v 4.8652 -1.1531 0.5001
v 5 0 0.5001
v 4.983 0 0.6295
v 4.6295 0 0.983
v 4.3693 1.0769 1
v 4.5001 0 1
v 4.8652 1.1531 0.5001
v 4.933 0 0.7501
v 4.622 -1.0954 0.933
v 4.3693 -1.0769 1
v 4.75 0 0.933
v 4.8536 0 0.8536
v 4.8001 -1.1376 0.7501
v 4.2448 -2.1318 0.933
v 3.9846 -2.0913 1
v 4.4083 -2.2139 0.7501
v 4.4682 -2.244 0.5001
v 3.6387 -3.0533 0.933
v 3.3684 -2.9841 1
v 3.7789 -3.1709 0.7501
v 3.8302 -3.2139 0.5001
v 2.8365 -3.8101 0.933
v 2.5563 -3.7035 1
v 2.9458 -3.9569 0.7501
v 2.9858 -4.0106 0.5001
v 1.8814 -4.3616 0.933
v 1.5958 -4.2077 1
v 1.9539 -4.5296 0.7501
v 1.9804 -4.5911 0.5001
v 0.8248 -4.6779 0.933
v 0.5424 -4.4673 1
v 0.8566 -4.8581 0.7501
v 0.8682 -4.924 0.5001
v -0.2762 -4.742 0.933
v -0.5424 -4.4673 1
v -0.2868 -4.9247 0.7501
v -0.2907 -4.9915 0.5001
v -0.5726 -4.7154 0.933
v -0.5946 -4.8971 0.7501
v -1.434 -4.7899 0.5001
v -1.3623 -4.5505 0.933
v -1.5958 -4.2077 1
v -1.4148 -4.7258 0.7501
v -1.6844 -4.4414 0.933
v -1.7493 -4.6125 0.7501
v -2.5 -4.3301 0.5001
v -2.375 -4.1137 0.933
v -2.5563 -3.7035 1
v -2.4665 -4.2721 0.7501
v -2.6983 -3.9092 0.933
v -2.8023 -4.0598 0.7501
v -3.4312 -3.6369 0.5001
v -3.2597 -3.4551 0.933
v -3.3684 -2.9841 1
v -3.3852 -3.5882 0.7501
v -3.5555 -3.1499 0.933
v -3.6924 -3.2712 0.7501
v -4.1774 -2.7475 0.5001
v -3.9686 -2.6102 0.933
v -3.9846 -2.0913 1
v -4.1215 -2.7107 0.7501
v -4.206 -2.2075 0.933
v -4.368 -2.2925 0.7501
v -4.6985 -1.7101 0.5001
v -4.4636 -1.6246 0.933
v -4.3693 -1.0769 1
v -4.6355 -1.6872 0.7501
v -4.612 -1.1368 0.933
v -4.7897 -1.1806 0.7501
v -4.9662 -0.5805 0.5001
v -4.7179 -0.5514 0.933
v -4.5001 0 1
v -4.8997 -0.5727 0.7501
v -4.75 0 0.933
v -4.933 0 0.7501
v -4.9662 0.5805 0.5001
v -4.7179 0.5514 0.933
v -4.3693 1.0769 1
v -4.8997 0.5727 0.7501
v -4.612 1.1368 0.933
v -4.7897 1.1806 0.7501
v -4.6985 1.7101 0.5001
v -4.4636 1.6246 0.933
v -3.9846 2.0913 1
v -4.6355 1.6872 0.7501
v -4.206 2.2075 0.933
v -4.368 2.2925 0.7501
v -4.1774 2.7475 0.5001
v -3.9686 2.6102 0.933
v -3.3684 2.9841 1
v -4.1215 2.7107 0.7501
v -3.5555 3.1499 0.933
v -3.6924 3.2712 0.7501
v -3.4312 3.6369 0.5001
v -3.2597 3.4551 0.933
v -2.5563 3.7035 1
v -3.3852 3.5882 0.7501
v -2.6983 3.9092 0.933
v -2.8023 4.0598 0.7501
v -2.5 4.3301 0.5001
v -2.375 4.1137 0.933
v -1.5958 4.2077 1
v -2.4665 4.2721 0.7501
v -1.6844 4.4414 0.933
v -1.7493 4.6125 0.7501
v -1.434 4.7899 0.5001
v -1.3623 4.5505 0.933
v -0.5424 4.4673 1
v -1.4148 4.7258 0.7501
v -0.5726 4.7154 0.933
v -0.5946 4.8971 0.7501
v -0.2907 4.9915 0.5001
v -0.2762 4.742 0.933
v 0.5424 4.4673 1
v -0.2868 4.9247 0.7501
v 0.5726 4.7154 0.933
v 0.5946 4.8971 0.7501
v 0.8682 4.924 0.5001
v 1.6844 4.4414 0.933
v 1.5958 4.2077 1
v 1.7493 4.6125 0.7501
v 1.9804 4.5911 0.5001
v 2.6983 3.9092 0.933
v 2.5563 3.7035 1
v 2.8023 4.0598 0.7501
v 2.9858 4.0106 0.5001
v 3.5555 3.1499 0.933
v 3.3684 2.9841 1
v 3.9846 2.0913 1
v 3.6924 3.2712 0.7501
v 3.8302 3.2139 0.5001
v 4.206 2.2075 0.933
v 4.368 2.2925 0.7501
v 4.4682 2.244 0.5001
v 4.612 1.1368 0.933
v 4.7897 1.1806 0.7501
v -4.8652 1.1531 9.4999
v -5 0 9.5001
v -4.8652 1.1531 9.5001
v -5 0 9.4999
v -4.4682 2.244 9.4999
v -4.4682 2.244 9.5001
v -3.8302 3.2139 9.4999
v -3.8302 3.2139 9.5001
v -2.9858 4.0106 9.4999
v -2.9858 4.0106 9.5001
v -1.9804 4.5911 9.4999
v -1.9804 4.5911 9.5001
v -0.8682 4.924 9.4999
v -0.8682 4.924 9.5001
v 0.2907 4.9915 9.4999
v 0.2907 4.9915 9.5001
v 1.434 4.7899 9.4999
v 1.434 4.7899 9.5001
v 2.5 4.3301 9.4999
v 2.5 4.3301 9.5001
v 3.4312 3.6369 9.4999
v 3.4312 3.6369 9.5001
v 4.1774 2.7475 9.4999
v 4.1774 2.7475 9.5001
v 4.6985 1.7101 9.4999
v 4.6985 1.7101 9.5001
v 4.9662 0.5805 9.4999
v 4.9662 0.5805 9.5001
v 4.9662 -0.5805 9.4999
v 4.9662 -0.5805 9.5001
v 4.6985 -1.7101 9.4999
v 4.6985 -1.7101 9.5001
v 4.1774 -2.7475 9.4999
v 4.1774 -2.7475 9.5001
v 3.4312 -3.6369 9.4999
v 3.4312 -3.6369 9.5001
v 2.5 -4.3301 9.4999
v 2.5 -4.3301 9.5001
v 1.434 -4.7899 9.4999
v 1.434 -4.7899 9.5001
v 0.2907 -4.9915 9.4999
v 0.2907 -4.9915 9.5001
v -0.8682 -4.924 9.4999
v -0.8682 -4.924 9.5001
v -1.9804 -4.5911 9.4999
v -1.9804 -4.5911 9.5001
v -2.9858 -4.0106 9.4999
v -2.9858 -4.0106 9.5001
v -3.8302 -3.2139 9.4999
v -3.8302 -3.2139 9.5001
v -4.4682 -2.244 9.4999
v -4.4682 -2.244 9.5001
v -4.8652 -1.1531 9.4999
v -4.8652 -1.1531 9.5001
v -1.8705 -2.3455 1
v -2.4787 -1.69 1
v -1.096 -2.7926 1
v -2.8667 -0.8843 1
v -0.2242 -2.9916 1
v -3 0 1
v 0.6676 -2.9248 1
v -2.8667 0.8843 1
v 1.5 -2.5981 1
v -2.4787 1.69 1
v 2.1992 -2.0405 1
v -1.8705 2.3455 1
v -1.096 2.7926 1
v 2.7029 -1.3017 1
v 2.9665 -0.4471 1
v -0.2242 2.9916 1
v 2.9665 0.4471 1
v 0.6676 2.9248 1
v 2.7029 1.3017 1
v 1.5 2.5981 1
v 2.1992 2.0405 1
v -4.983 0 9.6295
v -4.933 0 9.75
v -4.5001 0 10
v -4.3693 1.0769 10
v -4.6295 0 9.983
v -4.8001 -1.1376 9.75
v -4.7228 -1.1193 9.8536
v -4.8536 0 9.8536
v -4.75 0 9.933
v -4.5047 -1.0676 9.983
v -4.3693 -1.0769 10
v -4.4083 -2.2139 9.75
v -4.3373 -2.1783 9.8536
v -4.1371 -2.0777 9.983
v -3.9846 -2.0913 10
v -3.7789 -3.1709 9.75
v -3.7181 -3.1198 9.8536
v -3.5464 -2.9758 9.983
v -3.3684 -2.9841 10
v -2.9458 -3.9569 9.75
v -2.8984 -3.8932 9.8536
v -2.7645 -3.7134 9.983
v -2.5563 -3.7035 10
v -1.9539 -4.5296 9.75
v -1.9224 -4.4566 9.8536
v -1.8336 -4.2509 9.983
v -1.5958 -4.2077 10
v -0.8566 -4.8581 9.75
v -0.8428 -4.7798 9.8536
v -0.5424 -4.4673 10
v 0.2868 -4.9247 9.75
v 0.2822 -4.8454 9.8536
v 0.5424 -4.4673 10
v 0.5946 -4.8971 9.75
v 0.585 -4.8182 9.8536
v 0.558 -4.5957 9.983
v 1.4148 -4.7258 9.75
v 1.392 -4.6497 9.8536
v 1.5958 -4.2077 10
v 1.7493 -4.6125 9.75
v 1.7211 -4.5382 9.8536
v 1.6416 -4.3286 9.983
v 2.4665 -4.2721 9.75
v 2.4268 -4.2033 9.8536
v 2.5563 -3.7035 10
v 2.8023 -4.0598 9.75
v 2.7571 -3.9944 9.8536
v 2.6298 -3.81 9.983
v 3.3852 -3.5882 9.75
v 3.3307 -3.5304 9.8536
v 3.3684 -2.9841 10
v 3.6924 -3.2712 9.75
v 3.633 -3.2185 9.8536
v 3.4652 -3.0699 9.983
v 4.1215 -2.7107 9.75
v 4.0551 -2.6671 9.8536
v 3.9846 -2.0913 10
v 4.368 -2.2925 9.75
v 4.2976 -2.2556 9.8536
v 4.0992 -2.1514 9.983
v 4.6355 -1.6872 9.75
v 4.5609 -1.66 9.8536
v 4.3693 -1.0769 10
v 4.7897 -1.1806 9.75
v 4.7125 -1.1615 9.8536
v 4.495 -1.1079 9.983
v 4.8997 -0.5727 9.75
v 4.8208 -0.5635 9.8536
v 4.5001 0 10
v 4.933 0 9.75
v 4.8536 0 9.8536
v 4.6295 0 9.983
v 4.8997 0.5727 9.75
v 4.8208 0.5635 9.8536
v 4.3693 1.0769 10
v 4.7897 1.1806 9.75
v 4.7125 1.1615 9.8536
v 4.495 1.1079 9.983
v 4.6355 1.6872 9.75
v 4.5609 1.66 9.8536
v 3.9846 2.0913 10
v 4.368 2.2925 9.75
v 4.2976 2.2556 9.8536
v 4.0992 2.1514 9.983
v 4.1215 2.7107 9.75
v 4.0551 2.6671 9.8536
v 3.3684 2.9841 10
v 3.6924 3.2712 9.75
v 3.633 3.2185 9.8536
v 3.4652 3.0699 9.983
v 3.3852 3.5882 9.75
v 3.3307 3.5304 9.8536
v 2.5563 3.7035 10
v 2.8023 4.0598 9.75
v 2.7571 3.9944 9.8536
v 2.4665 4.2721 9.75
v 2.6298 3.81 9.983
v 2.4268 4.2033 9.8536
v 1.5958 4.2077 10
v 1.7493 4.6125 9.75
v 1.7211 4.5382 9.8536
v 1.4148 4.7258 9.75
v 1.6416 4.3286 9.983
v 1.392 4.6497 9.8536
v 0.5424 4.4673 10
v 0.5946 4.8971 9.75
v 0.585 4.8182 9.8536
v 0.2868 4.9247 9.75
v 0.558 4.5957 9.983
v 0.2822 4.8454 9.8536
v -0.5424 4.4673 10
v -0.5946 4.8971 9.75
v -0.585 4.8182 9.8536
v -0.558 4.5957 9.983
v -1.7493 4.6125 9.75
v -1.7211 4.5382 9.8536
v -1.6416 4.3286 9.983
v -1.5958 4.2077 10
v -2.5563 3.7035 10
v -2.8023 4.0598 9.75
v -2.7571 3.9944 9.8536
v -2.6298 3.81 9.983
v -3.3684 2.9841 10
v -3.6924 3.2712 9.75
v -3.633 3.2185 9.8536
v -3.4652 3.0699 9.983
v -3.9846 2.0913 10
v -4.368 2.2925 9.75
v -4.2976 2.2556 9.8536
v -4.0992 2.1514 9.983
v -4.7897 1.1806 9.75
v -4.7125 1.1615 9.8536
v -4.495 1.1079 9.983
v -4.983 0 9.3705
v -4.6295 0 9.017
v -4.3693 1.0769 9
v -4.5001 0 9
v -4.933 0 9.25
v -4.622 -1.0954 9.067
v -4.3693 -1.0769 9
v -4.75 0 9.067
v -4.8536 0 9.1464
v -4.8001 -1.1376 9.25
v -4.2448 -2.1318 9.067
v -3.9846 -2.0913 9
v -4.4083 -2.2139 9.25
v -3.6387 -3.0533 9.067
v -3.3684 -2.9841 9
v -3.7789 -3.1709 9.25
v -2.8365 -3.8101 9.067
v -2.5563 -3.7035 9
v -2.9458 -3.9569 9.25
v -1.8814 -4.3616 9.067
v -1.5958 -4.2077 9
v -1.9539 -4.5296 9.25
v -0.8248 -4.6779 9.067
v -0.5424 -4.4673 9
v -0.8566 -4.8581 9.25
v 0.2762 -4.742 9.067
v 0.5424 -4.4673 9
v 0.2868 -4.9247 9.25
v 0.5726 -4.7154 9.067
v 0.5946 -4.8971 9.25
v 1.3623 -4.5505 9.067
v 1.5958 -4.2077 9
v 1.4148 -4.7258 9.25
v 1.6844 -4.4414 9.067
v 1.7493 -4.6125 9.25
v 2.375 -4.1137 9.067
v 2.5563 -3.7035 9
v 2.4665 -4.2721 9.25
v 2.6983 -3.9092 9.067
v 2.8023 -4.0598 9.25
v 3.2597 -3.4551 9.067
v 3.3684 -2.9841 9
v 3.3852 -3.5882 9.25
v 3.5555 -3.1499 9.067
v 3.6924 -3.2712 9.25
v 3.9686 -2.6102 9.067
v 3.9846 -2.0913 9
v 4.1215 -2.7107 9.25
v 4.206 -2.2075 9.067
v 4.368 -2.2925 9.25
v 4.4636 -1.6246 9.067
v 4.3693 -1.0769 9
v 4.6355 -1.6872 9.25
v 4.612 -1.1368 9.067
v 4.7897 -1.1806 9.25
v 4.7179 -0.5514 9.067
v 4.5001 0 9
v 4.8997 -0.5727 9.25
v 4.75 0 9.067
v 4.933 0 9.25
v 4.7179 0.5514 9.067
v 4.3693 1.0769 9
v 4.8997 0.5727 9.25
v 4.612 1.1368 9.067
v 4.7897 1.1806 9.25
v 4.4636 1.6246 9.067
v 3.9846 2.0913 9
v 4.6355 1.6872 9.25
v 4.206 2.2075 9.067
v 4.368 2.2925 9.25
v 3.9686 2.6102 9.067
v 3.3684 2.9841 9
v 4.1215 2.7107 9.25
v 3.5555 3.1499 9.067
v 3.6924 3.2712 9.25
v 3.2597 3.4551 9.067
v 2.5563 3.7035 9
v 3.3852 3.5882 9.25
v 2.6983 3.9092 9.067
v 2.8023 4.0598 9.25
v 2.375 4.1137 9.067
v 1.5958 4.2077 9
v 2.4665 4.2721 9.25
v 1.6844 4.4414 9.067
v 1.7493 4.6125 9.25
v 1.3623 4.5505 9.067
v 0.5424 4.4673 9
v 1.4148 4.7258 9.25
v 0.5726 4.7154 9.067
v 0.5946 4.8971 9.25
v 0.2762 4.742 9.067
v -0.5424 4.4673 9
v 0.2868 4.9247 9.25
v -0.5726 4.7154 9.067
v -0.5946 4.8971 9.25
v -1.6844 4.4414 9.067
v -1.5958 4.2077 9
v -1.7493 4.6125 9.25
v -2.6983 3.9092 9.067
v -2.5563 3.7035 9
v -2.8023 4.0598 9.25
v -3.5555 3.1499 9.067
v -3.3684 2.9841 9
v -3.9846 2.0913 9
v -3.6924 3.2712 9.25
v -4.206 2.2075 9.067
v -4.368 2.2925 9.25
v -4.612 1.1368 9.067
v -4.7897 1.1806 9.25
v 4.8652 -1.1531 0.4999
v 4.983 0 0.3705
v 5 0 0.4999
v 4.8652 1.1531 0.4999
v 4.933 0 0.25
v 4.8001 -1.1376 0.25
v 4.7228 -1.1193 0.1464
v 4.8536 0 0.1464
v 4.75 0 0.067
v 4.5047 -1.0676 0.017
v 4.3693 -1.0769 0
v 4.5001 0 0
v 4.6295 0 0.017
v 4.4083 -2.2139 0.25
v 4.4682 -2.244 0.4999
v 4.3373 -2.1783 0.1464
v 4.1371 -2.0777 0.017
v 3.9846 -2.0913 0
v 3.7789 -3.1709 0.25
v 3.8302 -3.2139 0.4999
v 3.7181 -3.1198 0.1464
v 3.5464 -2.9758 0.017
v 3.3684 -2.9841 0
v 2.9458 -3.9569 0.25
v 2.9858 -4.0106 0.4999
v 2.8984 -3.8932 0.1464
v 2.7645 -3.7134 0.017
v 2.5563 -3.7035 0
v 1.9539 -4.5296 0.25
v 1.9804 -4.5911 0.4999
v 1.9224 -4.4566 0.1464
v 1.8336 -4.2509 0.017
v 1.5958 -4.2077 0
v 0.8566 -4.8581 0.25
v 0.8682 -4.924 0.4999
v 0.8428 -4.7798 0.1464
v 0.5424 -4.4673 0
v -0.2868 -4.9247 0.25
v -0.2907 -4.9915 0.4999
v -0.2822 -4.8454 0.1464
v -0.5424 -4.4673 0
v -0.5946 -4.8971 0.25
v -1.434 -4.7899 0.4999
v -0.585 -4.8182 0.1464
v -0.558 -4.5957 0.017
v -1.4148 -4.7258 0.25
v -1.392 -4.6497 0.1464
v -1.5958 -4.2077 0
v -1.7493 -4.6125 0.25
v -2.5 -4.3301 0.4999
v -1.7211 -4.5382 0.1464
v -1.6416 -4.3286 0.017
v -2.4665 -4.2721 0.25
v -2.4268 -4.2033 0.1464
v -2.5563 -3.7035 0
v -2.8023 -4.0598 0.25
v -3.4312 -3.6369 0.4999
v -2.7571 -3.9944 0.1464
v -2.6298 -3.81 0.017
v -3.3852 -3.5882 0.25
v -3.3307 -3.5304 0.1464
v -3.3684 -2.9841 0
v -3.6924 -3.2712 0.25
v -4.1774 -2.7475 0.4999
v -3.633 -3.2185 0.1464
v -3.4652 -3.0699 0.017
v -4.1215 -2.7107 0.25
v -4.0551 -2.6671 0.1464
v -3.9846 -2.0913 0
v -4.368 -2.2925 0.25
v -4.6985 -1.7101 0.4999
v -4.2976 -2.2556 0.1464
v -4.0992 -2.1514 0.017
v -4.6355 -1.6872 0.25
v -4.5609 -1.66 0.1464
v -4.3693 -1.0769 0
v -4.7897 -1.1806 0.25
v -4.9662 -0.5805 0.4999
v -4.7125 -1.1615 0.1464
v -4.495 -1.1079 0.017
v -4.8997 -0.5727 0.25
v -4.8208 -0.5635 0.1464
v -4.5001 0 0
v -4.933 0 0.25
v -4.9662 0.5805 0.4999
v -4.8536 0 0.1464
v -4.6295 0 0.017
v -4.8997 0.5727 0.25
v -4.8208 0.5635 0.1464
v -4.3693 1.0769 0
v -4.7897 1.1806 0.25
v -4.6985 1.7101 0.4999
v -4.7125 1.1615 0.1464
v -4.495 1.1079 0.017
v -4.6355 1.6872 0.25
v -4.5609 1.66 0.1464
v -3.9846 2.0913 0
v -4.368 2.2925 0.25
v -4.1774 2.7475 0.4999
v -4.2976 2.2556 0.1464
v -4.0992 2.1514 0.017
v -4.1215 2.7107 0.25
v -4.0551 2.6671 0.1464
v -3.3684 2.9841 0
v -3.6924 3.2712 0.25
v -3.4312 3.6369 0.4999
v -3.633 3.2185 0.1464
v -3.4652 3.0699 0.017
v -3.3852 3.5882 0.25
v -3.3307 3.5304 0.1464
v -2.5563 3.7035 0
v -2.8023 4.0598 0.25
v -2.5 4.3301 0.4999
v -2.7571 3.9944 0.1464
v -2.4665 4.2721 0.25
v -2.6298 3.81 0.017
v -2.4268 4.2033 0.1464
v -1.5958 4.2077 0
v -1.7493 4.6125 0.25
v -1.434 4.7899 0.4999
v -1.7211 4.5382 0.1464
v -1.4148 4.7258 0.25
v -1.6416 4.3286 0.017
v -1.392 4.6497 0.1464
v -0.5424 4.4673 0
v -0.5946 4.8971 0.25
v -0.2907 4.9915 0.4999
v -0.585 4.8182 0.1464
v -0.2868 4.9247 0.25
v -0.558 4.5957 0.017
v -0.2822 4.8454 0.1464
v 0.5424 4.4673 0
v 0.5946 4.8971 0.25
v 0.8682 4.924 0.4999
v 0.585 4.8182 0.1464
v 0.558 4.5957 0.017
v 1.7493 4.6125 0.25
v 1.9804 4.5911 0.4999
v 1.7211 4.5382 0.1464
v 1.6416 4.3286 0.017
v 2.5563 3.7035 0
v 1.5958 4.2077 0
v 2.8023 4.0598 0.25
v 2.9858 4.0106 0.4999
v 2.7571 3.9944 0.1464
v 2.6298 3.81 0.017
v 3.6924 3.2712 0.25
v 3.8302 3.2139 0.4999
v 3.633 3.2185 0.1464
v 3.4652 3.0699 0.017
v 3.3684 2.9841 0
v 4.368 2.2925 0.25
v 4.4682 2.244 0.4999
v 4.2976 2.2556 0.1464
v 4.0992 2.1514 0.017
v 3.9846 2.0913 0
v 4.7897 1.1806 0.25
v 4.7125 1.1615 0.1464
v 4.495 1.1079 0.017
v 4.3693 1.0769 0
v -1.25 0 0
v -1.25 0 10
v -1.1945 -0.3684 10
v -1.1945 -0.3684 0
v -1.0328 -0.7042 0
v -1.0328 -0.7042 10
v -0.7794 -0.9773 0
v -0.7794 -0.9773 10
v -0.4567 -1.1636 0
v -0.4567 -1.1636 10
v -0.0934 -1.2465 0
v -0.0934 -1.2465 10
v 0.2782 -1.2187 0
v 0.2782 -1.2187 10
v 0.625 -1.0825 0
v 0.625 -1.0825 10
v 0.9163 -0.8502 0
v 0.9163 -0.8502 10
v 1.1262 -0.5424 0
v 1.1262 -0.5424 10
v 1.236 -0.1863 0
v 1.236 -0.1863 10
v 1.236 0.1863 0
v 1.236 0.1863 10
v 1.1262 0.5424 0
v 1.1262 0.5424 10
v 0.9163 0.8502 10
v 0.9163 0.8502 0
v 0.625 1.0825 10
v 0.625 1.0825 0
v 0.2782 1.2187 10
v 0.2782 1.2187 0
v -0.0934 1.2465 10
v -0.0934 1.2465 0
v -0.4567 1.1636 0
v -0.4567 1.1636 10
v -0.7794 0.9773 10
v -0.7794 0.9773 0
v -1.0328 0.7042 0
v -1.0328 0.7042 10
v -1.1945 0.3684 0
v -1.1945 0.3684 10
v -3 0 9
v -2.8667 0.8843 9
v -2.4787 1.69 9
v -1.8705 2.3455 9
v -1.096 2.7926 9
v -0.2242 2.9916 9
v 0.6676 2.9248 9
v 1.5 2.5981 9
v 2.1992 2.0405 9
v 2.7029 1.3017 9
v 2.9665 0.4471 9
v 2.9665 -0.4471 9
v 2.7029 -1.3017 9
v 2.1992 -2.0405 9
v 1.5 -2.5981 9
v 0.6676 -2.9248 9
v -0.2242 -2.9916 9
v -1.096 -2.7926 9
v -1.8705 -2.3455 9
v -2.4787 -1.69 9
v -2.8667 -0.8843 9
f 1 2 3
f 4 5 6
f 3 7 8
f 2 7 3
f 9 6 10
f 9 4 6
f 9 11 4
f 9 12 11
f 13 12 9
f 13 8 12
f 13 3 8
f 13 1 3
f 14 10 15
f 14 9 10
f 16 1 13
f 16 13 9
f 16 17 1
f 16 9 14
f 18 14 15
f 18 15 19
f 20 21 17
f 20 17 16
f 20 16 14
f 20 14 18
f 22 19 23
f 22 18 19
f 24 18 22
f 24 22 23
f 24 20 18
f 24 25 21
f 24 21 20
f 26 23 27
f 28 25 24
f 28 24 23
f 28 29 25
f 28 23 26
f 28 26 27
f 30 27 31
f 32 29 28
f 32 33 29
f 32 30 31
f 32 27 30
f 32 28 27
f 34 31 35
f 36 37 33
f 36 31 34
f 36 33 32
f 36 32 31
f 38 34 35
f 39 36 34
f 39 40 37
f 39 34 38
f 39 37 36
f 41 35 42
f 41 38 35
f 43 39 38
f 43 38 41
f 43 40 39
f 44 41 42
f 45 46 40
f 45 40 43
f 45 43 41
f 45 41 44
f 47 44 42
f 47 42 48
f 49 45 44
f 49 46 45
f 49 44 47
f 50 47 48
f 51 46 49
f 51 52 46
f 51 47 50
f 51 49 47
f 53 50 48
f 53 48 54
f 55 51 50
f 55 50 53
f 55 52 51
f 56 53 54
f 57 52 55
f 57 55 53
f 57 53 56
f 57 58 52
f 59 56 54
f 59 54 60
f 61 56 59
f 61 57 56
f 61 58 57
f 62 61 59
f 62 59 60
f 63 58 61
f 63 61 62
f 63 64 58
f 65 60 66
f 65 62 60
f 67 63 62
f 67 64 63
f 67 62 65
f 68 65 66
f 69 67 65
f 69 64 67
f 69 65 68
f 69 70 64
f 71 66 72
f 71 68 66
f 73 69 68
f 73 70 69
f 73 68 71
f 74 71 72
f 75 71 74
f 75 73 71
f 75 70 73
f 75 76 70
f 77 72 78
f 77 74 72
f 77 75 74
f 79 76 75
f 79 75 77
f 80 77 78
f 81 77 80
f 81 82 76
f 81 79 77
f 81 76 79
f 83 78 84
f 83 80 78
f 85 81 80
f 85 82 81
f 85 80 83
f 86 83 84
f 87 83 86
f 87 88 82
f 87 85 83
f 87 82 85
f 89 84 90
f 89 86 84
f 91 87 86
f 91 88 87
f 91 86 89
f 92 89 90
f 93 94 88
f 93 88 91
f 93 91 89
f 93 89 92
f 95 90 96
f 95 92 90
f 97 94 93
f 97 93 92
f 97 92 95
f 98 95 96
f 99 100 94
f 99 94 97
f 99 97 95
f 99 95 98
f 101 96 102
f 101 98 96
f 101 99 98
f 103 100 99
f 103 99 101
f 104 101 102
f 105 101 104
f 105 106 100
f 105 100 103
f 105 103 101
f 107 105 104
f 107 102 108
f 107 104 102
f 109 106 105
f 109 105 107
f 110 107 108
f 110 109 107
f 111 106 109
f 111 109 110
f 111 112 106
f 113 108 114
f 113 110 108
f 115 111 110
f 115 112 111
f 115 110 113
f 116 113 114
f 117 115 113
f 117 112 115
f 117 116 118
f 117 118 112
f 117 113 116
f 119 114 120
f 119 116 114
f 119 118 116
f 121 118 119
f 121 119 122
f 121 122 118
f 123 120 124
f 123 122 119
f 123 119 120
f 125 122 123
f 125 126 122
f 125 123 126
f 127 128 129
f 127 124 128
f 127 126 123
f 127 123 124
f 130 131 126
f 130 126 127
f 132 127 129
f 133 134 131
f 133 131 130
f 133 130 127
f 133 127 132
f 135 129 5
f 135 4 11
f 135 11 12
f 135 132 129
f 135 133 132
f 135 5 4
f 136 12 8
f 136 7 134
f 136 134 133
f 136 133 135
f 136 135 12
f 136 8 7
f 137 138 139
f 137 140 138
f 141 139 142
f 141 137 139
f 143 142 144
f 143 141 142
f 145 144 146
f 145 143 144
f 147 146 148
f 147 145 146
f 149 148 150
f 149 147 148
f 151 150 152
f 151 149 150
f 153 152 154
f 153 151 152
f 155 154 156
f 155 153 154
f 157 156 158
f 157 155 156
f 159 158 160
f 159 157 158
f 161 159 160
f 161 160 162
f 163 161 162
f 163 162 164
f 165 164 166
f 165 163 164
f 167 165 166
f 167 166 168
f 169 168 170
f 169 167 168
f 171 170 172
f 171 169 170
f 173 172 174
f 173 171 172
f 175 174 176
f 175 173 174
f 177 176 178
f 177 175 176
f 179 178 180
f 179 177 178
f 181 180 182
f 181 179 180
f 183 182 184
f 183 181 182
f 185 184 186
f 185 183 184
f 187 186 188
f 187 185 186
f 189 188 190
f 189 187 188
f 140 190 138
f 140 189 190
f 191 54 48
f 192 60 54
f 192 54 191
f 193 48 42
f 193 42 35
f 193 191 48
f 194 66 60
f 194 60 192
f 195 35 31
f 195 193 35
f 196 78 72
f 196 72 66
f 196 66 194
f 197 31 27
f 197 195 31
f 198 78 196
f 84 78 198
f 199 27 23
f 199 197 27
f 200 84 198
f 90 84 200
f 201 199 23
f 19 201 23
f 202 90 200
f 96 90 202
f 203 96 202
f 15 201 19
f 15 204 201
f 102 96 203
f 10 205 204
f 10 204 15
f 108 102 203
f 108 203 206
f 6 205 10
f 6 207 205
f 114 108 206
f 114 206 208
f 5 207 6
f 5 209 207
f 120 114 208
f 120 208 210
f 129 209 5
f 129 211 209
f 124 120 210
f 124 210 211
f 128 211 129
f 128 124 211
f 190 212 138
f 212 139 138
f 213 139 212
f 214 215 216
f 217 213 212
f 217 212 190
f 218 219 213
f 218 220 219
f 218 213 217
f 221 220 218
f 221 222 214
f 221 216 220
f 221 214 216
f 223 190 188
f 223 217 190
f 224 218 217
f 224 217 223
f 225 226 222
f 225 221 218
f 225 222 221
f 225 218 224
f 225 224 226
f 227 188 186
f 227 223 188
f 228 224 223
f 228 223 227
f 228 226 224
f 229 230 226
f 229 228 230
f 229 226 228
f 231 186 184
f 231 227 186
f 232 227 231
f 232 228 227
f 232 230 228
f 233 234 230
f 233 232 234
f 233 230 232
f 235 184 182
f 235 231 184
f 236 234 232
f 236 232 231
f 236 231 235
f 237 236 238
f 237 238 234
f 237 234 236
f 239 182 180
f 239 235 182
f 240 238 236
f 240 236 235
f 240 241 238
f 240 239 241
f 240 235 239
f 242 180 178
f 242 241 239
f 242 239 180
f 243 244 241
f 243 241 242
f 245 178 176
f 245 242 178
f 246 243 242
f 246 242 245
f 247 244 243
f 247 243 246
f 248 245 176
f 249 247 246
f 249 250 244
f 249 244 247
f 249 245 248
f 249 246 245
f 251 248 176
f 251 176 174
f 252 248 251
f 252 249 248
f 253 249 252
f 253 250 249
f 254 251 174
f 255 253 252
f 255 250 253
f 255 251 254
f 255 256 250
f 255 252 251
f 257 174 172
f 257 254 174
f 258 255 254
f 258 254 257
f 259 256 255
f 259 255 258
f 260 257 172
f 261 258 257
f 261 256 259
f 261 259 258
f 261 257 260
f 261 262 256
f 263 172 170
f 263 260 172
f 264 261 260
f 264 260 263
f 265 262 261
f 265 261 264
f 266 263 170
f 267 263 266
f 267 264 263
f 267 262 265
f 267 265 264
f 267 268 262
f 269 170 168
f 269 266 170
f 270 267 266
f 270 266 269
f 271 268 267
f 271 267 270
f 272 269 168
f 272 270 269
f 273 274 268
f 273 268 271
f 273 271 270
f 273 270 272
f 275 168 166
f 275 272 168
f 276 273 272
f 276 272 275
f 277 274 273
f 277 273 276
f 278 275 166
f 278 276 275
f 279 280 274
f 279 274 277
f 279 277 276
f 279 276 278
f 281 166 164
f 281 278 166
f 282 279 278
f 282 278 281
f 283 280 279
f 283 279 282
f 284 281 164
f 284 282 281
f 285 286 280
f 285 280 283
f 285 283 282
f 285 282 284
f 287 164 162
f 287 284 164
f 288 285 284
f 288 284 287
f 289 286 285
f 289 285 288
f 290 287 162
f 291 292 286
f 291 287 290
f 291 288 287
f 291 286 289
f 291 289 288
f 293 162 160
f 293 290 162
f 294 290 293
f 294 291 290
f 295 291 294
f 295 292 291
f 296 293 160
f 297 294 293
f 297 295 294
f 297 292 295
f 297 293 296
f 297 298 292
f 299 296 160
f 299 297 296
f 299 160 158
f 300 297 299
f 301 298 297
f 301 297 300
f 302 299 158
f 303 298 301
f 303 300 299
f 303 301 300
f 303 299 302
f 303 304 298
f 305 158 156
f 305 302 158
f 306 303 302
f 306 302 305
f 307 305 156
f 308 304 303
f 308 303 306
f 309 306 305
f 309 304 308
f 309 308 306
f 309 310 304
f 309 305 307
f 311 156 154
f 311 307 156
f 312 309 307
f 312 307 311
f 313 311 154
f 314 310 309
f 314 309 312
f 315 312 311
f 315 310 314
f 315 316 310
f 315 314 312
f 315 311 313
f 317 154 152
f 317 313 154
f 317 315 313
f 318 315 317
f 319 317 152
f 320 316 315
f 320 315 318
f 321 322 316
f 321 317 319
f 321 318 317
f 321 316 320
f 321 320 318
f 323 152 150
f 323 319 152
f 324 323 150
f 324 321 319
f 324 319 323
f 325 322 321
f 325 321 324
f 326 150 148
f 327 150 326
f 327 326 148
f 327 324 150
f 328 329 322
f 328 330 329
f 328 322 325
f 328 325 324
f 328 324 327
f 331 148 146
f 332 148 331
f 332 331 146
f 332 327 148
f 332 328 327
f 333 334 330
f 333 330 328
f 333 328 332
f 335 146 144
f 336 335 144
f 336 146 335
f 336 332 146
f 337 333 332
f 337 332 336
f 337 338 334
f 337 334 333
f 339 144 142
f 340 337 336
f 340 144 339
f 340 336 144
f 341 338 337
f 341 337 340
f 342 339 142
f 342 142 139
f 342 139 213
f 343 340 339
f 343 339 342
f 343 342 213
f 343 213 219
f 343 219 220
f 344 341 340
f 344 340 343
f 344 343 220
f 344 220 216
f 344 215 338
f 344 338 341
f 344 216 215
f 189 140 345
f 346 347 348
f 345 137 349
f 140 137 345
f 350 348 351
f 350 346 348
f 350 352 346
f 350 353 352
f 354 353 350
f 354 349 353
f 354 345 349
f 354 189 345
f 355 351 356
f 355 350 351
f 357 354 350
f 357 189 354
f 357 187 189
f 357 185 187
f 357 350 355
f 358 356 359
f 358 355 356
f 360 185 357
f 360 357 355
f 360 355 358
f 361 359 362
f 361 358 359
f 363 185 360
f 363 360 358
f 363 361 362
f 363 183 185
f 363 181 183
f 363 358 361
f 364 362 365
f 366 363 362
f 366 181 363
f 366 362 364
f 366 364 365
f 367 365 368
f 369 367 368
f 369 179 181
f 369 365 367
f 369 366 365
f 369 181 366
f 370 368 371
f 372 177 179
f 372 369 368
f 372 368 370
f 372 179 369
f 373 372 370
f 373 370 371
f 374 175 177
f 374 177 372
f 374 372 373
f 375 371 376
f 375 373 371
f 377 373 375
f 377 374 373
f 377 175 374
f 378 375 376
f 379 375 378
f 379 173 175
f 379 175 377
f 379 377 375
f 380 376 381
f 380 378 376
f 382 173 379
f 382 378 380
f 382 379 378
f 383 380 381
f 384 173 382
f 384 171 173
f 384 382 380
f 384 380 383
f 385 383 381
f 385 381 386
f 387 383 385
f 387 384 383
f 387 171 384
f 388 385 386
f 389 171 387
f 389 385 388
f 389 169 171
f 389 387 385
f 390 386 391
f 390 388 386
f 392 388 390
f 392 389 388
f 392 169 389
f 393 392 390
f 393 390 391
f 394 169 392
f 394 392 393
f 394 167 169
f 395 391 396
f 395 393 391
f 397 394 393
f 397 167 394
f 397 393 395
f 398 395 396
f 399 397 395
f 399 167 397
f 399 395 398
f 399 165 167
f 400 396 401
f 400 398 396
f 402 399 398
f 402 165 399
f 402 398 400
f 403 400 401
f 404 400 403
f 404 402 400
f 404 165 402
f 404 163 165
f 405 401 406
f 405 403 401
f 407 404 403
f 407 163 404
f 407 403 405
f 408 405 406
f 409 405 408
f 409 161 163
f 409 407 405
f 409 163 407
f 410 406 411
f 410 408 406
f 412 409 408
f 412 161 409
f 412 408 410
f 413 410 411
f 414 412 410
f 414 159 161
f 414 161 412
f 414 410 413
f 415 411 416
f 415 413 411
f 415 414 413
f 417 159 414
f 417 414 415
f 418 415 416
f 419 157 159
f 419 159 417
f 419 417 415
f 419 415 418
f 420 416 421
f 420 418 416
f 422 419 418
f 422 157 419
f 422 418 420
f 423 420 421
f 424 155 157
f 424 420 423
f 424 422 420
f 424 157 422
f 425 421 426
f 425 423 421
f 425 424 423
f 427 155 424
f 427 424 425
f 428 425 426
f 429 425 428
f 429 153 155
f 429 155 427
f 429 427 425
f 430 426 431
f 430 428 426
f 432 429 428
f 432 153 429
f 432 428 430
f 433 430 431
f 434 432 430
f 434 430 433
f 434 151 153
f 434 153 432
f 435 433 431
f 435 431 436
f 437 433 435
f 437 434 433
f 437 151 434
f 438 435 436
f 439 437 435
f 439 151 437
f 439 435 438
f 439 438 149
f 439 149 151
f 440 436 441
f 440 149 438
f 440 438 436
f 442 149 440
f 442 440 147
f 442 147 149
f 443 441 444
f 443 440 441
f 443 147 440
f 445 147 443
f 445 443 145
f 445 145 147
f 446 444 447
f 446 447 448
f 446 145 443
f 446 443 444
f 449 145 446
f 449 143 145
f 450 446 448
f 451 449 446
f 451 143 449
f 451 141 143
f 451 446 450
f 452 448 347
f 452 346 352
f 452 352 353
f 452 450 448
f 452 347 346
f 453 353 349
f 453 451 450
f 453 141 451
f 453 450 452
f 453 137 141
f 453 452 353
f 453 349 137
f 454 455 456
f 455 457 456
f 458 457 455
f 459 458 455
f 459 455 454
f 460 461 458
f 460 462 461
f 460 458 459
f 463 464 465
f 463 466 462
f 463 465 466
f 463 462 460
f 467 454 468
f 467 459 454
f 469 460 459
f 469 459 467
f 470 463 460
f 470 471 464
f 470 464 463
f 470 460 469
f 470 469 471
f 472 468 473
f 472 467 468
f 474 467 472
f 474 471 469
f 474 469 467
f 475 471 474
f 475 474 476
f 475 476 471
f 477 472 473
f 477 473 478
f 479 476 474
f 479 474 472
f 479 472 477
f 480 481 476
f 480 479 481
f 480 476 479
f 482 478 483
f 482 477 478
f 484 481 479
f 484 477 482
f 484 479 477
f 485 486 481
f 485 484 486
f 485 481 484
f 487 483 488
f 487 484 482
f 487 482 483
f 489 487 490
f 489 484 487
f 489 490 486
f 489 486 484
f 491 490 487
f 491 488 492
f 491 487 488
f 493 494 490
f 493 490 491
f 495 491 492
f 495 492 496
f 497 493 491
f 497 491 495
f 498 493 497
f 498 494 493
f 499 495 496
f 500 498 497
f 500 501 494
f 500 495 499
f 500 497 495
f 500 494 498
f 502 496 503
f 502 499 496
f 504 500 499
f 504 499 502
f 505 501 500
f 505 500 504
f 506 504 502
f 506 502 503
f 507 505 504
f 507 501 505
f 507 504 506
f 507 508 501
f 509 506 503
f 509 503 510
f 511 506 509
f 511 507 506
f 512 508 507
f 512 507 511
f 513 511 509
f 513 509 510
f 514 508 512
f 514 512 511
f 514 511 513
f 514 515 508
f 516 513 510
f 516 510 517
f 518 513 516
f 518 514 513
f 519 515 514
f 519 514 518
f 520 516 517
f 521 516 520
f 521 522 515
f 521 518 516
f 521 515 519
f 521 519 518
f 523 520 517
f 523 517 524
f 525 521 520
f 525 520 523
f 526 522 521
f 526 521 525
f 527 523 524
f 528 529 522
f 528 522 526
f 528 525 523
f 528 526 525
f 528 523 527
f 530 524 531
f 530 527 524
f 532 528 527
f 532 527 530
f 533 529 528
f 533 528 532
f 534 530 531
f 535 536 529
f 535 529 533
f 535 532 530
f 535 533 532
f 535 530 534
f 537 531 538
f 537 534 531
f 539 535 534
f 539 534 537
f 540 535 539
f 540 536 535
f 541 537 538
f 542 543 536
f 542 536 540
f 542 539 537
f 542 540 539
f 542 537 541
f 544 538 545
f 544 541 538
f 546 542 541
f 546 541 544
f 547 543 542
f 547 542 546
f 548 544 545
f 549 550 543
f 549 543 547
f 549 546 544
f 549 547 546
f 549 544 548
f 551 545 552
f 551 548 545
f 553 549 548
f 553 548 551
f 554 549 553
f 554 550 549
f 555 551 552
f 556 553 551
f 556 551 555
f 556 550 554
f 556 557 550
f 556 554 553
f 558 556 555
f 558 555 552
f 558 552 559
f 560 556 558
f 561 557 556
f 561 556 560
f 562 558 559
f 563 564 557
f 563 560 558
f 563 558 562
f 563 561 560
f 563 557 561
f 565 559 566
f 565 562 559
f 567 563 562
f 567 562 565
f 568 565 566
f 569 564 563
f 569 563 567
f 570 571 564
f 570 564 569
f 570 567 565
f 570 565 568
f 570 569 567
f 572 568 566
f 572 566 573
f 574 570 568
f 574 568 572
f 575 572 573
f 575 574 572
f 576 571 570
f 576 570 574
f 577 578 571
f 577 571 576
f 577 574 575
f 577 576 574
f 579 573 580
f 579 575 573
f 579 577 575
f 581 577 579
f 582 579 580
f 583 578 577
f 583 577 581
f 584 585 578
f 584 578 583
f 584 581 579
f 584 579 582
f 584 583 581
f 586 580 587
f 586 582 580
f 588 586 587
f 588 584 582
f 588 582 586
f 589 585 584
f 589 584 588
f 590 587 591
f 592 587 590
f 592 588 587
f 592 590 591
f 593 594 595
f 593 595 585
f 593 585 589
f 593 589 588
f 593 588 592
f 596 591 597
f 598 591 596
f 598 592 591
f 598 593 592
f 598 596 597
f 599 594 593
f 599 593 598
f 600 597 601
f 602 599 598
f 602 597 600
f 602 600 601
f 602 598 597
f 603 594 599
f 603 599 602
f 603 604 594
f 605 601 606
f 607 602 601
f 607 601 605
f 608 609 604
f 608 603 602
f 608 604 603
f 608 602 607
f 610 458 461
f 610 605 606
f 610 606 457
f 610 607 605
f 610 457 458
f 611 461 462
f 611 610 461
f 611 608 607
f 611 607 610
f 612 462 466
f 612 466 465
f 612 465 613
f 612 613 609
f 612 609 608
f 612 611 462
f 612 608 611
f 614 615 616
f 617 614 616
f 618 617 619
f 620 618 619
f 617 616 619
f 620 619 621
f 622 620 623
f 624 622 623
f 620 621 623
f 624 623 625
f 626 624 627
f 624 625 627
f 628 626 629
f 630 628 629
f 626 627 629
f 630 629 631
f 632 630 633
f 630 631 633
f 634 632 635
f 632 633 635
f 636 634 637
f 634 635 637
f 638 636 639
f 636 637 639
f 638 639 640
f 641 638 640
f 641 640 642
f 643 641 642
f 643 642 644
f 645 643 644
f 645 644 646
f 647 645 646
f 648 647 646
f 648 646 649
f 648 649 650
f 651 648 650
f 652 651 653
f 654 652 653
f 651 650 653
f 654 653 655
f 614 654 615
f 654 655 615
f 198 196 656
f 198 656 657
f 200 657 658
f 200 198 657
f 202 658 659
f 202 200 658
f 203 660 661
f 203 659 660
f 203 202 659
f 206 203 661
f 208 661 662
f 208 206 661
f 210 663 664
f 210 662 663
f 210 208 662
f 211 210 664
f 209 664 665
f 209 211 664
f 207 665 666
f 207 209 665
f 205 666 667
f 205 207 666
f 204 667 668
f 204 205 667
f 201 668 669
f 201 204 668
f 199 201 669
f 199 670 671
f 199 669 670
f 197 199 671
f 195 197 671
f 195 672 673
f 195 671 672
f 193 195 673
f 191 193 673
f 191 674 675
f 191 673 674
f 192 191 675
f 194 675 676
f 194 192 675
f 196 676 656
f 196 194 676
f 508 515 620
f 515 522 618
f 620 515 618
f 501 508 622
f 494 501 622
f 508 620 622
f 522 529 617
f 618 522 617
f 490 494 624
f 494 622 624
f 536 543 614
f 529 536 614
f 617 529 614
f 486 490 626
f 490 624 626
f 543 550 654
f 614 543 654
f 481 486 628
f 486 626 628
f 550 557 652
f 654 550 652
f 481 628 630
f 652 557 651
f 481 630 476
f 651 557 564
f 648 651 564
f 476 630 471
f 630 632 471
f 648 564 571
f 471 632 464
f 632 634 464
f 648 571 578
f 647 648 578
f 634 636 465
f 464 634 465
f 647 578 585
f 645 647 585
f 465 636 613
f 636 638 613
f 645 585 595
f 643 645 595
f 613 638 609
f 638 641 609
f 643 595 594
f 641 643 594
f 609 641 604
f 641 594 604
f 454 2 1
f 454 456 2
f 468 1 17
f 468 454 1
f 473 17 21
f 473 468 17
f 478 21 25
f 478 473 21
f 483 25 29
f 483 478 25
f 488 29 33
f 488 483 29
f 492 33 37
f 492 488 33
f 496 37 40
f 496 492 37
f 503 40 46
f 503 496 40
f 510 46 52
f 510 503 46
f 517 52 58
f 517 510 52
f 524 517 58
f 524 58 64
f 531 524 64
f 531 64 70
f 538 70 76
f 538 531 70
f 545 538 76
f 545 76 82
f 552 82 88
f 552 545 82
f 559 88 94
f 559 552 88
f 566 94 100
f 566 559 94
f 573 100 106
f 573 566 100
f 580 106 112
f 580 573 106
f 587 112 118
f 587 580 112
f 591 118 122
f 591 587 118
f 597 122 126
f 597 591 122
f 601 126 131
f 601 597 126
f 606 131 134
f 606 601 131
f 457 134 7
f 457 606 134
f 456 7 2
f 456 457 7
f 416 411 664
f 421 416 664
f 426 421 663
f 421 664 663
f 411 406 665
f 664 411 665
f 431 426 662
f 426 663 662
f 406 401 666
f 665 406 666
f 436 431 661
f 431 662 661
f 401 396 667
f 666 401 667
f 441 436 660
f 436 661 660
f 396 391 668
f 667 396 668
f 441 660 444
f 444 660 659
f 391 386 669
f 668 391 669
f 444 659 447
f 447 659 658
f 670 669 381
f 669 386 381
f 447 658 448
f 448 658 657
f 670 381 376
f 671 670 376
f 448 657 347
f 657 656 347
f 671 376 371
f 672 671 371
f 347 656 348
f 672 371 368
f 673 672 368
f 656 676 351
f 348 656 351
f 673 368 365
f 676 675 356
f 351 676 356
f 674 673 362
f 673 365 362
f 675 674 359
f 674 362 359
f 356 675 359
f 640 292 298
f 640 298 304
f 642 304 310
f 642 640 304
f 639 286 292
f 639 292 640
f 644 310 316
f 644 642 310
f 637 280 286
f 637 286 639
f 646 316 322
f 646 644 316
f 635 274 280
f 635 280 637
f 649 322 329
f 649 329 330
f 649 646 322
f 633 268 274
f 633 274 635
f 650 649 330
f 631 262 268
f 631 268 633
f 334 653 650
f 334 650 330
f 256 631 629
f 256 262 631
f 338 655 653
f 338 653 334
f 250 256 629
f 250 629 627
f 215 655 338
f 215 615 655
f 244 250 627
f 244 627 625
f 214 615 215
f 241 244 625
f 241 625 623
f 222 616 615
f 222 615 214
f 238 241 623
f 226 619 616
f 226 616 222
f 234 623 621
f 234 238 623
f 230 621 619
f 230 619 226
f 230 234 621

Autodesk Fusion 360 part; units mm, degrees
sketch "Esquisse1" plane through (0, 0, 0) normal (0, 0, 1) x (1, 0, 0)
  circle A0 centre (0, 0) radius 5
  dimension "d1" = 10
extrude "Extrusion1" add sketch "Esquisse1" along normal blind 1
sketch "Esquisse2" plane through (0, 0, 1) normal (0, 0, 1) x (-1, 0, 0)
  circle A0 centre (0, 0) radius 5
  circle A1 centre (0, 0) radius 3
  dimension "d4" = 6
extrude "Extrusion2" add sketch "Esquisse2" along normal blind 8 contours A1
sketch "Esquisse3" plane through (0, 0, 9) normal (0, 0, 1) x (-1, 0, 0)
  circle A0 centre (0, 0) radius 3
  circle A1 centre (0, 0) radius 5
  dimension "d7" = 10
extrude "Extrusion3" add sketch "Esquisse3" along normal blind 1 contours A0 | A1
sketch "Esquisse4" plane through (0, 0, 10) normal (0, 0, 1) x (-1, 0, 0)
  circle A0 centre (0, 0) radius 5
  circle A1 centre (0, 0) radius 1.25
  dimension "d10" = 2.5
extrude "Extrusion4" cut sketch "Esquisse4" against normal blind 10 contours A1
fillet "Congé1" radius 0.5 4 edges at (-4.6616, -1.8081, 1) (4.6616, 1.8081, 9) (4.6616, 1.8081, 10) (-4.6616, -1.8081, 0)
